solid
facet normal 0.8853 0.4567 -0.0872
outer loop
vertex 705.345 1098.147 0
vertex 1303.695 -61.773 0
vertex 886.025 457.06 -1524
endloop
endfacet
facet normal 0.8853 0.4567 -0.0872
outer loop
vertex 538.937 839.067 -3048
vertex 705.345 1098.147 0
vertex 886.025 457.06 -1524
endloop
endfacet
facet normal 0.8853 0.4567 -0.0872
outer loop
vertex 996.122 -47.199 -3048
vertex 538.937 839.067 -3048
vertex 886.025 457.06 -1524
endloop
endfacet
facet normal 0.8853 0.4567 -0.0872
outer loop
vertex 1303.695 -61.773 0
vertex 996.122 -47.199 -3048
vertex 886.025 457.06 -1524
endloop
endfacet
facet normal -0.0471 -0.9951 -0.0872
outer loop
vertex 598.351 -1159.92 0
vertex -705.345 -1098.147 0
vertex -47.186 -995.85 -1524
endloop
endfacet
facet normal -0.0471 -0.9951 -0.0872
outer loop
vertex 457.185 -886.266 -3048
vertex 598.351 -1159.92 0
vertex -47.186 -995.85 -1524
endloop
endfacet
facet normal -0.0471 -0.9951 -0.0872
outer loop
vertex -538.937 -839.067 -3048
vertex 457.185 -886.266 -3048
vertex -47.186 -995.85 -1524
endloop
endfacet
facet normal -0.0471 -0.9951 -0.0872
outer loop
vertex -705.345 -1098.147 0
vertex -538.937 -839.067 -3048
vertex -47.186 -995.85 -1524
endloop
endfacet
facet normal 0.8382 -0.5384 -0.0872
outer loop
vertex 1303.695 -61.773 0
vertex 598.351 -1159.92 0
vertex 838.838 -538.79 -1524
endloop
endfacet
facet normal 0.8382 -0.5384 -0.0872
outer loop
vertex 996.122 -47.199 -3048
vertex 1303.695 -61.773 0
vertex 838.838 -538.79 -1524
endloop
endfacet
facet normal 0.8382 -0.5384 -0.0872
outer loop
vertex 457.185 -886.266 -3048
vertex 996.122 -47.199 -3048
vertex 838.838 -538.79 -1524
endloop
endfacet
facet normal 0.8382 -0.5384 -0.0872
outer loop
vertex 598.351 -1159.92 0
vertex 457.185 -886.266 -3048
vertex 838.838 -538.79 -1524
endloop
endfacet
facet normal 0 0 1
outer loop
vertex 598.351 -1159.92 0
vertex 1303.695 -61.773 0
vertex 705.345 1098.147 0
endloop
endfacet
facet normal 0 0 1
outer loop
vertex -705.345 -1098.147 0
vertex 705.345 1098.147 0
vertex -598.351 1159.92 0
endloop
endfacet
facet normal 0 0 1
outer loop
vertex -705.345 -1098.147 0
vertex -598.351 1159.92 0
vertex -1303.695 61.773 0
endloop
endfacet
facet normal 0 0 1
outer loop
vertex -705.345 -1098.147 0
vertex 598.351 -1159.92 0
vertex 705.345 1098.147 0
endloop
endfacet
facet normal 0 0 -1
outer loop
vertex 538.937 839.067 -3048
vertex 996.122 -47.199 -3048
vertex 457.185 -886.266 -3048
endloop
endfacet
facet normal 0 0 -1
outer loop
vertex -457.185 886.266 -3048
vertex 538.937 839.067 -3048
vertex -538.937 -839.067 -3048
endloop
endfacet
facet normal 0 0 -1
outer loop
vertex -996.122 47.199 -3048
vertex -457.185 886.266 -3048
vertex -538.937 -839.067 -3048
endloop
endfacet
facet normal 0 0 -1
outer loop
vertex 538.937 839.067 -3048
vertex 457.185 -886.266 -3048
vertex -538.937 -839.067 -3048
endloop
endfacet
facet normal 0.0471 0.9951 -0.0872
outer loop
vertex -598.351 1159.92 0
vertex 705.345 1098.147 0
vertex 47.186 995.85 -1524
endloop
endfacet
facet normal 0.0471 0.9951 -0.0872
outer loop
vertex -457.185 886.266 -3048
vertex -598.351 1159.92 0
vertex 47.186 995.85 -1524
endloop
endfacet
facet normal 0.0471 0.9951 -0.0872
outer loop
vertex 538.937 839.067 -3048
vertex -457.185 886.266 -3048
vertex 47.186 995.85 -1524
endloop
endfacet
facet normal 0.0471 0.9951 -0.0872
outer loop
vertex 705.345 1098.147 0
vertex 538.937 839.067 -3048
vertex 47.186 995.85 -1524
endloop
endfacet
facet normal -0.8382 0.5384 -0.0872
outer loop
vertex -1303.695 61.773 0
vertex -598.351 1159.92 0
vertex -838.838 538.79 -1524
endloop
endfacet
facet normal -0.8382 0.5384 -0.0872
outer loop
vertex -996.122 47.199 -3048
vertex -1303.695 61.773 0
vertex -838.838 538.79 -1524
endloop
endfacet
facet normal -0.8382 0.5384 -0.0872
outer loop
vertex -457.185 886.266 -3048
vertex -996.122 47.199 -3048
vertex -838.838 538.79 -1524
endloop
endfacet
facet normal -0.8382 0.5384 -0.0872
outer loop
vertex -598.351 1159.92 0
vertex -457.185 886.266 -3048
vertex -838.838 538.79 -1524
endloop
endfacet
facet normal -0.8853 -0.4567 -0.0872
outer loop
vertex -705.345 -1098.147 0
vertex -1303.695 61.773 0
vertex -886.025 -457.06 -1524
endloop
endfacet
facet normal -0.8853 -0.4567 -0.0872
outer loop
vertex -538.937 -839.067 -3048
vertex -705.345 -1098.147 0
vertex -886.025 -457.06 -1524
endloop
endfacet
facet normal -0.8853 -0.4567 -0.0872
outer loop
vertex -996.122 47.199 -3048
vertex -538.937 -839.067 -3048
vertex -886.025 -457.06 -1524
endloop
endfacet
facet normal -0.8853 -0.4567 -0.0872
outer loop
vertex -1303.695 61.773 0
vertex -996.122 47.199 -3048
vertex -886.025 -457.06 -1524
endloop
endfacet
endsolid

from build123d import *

# Parameters (mm, degrees)
F1_DEPTH = 3048
F1_TAPER = 5


with BuildPart() as f1:
    # F0 (on Top) → F1 (new body)
    with BuildSketch(Plane.XY):
        Polygon((1303.6953418973, -61.7730430585), (705.3446955063, 1098.1467633492), (-598.3506463909, 1159.9198064077), (-1303.6953418973, 61.7730430585), (-705.3446955063, -1098.1467633492), (598.3506463909, -1159.9198064077), align=None)
    extrude(amount=-F1_DEPTH, taper=F1_TAPER)


solid = f1.part
